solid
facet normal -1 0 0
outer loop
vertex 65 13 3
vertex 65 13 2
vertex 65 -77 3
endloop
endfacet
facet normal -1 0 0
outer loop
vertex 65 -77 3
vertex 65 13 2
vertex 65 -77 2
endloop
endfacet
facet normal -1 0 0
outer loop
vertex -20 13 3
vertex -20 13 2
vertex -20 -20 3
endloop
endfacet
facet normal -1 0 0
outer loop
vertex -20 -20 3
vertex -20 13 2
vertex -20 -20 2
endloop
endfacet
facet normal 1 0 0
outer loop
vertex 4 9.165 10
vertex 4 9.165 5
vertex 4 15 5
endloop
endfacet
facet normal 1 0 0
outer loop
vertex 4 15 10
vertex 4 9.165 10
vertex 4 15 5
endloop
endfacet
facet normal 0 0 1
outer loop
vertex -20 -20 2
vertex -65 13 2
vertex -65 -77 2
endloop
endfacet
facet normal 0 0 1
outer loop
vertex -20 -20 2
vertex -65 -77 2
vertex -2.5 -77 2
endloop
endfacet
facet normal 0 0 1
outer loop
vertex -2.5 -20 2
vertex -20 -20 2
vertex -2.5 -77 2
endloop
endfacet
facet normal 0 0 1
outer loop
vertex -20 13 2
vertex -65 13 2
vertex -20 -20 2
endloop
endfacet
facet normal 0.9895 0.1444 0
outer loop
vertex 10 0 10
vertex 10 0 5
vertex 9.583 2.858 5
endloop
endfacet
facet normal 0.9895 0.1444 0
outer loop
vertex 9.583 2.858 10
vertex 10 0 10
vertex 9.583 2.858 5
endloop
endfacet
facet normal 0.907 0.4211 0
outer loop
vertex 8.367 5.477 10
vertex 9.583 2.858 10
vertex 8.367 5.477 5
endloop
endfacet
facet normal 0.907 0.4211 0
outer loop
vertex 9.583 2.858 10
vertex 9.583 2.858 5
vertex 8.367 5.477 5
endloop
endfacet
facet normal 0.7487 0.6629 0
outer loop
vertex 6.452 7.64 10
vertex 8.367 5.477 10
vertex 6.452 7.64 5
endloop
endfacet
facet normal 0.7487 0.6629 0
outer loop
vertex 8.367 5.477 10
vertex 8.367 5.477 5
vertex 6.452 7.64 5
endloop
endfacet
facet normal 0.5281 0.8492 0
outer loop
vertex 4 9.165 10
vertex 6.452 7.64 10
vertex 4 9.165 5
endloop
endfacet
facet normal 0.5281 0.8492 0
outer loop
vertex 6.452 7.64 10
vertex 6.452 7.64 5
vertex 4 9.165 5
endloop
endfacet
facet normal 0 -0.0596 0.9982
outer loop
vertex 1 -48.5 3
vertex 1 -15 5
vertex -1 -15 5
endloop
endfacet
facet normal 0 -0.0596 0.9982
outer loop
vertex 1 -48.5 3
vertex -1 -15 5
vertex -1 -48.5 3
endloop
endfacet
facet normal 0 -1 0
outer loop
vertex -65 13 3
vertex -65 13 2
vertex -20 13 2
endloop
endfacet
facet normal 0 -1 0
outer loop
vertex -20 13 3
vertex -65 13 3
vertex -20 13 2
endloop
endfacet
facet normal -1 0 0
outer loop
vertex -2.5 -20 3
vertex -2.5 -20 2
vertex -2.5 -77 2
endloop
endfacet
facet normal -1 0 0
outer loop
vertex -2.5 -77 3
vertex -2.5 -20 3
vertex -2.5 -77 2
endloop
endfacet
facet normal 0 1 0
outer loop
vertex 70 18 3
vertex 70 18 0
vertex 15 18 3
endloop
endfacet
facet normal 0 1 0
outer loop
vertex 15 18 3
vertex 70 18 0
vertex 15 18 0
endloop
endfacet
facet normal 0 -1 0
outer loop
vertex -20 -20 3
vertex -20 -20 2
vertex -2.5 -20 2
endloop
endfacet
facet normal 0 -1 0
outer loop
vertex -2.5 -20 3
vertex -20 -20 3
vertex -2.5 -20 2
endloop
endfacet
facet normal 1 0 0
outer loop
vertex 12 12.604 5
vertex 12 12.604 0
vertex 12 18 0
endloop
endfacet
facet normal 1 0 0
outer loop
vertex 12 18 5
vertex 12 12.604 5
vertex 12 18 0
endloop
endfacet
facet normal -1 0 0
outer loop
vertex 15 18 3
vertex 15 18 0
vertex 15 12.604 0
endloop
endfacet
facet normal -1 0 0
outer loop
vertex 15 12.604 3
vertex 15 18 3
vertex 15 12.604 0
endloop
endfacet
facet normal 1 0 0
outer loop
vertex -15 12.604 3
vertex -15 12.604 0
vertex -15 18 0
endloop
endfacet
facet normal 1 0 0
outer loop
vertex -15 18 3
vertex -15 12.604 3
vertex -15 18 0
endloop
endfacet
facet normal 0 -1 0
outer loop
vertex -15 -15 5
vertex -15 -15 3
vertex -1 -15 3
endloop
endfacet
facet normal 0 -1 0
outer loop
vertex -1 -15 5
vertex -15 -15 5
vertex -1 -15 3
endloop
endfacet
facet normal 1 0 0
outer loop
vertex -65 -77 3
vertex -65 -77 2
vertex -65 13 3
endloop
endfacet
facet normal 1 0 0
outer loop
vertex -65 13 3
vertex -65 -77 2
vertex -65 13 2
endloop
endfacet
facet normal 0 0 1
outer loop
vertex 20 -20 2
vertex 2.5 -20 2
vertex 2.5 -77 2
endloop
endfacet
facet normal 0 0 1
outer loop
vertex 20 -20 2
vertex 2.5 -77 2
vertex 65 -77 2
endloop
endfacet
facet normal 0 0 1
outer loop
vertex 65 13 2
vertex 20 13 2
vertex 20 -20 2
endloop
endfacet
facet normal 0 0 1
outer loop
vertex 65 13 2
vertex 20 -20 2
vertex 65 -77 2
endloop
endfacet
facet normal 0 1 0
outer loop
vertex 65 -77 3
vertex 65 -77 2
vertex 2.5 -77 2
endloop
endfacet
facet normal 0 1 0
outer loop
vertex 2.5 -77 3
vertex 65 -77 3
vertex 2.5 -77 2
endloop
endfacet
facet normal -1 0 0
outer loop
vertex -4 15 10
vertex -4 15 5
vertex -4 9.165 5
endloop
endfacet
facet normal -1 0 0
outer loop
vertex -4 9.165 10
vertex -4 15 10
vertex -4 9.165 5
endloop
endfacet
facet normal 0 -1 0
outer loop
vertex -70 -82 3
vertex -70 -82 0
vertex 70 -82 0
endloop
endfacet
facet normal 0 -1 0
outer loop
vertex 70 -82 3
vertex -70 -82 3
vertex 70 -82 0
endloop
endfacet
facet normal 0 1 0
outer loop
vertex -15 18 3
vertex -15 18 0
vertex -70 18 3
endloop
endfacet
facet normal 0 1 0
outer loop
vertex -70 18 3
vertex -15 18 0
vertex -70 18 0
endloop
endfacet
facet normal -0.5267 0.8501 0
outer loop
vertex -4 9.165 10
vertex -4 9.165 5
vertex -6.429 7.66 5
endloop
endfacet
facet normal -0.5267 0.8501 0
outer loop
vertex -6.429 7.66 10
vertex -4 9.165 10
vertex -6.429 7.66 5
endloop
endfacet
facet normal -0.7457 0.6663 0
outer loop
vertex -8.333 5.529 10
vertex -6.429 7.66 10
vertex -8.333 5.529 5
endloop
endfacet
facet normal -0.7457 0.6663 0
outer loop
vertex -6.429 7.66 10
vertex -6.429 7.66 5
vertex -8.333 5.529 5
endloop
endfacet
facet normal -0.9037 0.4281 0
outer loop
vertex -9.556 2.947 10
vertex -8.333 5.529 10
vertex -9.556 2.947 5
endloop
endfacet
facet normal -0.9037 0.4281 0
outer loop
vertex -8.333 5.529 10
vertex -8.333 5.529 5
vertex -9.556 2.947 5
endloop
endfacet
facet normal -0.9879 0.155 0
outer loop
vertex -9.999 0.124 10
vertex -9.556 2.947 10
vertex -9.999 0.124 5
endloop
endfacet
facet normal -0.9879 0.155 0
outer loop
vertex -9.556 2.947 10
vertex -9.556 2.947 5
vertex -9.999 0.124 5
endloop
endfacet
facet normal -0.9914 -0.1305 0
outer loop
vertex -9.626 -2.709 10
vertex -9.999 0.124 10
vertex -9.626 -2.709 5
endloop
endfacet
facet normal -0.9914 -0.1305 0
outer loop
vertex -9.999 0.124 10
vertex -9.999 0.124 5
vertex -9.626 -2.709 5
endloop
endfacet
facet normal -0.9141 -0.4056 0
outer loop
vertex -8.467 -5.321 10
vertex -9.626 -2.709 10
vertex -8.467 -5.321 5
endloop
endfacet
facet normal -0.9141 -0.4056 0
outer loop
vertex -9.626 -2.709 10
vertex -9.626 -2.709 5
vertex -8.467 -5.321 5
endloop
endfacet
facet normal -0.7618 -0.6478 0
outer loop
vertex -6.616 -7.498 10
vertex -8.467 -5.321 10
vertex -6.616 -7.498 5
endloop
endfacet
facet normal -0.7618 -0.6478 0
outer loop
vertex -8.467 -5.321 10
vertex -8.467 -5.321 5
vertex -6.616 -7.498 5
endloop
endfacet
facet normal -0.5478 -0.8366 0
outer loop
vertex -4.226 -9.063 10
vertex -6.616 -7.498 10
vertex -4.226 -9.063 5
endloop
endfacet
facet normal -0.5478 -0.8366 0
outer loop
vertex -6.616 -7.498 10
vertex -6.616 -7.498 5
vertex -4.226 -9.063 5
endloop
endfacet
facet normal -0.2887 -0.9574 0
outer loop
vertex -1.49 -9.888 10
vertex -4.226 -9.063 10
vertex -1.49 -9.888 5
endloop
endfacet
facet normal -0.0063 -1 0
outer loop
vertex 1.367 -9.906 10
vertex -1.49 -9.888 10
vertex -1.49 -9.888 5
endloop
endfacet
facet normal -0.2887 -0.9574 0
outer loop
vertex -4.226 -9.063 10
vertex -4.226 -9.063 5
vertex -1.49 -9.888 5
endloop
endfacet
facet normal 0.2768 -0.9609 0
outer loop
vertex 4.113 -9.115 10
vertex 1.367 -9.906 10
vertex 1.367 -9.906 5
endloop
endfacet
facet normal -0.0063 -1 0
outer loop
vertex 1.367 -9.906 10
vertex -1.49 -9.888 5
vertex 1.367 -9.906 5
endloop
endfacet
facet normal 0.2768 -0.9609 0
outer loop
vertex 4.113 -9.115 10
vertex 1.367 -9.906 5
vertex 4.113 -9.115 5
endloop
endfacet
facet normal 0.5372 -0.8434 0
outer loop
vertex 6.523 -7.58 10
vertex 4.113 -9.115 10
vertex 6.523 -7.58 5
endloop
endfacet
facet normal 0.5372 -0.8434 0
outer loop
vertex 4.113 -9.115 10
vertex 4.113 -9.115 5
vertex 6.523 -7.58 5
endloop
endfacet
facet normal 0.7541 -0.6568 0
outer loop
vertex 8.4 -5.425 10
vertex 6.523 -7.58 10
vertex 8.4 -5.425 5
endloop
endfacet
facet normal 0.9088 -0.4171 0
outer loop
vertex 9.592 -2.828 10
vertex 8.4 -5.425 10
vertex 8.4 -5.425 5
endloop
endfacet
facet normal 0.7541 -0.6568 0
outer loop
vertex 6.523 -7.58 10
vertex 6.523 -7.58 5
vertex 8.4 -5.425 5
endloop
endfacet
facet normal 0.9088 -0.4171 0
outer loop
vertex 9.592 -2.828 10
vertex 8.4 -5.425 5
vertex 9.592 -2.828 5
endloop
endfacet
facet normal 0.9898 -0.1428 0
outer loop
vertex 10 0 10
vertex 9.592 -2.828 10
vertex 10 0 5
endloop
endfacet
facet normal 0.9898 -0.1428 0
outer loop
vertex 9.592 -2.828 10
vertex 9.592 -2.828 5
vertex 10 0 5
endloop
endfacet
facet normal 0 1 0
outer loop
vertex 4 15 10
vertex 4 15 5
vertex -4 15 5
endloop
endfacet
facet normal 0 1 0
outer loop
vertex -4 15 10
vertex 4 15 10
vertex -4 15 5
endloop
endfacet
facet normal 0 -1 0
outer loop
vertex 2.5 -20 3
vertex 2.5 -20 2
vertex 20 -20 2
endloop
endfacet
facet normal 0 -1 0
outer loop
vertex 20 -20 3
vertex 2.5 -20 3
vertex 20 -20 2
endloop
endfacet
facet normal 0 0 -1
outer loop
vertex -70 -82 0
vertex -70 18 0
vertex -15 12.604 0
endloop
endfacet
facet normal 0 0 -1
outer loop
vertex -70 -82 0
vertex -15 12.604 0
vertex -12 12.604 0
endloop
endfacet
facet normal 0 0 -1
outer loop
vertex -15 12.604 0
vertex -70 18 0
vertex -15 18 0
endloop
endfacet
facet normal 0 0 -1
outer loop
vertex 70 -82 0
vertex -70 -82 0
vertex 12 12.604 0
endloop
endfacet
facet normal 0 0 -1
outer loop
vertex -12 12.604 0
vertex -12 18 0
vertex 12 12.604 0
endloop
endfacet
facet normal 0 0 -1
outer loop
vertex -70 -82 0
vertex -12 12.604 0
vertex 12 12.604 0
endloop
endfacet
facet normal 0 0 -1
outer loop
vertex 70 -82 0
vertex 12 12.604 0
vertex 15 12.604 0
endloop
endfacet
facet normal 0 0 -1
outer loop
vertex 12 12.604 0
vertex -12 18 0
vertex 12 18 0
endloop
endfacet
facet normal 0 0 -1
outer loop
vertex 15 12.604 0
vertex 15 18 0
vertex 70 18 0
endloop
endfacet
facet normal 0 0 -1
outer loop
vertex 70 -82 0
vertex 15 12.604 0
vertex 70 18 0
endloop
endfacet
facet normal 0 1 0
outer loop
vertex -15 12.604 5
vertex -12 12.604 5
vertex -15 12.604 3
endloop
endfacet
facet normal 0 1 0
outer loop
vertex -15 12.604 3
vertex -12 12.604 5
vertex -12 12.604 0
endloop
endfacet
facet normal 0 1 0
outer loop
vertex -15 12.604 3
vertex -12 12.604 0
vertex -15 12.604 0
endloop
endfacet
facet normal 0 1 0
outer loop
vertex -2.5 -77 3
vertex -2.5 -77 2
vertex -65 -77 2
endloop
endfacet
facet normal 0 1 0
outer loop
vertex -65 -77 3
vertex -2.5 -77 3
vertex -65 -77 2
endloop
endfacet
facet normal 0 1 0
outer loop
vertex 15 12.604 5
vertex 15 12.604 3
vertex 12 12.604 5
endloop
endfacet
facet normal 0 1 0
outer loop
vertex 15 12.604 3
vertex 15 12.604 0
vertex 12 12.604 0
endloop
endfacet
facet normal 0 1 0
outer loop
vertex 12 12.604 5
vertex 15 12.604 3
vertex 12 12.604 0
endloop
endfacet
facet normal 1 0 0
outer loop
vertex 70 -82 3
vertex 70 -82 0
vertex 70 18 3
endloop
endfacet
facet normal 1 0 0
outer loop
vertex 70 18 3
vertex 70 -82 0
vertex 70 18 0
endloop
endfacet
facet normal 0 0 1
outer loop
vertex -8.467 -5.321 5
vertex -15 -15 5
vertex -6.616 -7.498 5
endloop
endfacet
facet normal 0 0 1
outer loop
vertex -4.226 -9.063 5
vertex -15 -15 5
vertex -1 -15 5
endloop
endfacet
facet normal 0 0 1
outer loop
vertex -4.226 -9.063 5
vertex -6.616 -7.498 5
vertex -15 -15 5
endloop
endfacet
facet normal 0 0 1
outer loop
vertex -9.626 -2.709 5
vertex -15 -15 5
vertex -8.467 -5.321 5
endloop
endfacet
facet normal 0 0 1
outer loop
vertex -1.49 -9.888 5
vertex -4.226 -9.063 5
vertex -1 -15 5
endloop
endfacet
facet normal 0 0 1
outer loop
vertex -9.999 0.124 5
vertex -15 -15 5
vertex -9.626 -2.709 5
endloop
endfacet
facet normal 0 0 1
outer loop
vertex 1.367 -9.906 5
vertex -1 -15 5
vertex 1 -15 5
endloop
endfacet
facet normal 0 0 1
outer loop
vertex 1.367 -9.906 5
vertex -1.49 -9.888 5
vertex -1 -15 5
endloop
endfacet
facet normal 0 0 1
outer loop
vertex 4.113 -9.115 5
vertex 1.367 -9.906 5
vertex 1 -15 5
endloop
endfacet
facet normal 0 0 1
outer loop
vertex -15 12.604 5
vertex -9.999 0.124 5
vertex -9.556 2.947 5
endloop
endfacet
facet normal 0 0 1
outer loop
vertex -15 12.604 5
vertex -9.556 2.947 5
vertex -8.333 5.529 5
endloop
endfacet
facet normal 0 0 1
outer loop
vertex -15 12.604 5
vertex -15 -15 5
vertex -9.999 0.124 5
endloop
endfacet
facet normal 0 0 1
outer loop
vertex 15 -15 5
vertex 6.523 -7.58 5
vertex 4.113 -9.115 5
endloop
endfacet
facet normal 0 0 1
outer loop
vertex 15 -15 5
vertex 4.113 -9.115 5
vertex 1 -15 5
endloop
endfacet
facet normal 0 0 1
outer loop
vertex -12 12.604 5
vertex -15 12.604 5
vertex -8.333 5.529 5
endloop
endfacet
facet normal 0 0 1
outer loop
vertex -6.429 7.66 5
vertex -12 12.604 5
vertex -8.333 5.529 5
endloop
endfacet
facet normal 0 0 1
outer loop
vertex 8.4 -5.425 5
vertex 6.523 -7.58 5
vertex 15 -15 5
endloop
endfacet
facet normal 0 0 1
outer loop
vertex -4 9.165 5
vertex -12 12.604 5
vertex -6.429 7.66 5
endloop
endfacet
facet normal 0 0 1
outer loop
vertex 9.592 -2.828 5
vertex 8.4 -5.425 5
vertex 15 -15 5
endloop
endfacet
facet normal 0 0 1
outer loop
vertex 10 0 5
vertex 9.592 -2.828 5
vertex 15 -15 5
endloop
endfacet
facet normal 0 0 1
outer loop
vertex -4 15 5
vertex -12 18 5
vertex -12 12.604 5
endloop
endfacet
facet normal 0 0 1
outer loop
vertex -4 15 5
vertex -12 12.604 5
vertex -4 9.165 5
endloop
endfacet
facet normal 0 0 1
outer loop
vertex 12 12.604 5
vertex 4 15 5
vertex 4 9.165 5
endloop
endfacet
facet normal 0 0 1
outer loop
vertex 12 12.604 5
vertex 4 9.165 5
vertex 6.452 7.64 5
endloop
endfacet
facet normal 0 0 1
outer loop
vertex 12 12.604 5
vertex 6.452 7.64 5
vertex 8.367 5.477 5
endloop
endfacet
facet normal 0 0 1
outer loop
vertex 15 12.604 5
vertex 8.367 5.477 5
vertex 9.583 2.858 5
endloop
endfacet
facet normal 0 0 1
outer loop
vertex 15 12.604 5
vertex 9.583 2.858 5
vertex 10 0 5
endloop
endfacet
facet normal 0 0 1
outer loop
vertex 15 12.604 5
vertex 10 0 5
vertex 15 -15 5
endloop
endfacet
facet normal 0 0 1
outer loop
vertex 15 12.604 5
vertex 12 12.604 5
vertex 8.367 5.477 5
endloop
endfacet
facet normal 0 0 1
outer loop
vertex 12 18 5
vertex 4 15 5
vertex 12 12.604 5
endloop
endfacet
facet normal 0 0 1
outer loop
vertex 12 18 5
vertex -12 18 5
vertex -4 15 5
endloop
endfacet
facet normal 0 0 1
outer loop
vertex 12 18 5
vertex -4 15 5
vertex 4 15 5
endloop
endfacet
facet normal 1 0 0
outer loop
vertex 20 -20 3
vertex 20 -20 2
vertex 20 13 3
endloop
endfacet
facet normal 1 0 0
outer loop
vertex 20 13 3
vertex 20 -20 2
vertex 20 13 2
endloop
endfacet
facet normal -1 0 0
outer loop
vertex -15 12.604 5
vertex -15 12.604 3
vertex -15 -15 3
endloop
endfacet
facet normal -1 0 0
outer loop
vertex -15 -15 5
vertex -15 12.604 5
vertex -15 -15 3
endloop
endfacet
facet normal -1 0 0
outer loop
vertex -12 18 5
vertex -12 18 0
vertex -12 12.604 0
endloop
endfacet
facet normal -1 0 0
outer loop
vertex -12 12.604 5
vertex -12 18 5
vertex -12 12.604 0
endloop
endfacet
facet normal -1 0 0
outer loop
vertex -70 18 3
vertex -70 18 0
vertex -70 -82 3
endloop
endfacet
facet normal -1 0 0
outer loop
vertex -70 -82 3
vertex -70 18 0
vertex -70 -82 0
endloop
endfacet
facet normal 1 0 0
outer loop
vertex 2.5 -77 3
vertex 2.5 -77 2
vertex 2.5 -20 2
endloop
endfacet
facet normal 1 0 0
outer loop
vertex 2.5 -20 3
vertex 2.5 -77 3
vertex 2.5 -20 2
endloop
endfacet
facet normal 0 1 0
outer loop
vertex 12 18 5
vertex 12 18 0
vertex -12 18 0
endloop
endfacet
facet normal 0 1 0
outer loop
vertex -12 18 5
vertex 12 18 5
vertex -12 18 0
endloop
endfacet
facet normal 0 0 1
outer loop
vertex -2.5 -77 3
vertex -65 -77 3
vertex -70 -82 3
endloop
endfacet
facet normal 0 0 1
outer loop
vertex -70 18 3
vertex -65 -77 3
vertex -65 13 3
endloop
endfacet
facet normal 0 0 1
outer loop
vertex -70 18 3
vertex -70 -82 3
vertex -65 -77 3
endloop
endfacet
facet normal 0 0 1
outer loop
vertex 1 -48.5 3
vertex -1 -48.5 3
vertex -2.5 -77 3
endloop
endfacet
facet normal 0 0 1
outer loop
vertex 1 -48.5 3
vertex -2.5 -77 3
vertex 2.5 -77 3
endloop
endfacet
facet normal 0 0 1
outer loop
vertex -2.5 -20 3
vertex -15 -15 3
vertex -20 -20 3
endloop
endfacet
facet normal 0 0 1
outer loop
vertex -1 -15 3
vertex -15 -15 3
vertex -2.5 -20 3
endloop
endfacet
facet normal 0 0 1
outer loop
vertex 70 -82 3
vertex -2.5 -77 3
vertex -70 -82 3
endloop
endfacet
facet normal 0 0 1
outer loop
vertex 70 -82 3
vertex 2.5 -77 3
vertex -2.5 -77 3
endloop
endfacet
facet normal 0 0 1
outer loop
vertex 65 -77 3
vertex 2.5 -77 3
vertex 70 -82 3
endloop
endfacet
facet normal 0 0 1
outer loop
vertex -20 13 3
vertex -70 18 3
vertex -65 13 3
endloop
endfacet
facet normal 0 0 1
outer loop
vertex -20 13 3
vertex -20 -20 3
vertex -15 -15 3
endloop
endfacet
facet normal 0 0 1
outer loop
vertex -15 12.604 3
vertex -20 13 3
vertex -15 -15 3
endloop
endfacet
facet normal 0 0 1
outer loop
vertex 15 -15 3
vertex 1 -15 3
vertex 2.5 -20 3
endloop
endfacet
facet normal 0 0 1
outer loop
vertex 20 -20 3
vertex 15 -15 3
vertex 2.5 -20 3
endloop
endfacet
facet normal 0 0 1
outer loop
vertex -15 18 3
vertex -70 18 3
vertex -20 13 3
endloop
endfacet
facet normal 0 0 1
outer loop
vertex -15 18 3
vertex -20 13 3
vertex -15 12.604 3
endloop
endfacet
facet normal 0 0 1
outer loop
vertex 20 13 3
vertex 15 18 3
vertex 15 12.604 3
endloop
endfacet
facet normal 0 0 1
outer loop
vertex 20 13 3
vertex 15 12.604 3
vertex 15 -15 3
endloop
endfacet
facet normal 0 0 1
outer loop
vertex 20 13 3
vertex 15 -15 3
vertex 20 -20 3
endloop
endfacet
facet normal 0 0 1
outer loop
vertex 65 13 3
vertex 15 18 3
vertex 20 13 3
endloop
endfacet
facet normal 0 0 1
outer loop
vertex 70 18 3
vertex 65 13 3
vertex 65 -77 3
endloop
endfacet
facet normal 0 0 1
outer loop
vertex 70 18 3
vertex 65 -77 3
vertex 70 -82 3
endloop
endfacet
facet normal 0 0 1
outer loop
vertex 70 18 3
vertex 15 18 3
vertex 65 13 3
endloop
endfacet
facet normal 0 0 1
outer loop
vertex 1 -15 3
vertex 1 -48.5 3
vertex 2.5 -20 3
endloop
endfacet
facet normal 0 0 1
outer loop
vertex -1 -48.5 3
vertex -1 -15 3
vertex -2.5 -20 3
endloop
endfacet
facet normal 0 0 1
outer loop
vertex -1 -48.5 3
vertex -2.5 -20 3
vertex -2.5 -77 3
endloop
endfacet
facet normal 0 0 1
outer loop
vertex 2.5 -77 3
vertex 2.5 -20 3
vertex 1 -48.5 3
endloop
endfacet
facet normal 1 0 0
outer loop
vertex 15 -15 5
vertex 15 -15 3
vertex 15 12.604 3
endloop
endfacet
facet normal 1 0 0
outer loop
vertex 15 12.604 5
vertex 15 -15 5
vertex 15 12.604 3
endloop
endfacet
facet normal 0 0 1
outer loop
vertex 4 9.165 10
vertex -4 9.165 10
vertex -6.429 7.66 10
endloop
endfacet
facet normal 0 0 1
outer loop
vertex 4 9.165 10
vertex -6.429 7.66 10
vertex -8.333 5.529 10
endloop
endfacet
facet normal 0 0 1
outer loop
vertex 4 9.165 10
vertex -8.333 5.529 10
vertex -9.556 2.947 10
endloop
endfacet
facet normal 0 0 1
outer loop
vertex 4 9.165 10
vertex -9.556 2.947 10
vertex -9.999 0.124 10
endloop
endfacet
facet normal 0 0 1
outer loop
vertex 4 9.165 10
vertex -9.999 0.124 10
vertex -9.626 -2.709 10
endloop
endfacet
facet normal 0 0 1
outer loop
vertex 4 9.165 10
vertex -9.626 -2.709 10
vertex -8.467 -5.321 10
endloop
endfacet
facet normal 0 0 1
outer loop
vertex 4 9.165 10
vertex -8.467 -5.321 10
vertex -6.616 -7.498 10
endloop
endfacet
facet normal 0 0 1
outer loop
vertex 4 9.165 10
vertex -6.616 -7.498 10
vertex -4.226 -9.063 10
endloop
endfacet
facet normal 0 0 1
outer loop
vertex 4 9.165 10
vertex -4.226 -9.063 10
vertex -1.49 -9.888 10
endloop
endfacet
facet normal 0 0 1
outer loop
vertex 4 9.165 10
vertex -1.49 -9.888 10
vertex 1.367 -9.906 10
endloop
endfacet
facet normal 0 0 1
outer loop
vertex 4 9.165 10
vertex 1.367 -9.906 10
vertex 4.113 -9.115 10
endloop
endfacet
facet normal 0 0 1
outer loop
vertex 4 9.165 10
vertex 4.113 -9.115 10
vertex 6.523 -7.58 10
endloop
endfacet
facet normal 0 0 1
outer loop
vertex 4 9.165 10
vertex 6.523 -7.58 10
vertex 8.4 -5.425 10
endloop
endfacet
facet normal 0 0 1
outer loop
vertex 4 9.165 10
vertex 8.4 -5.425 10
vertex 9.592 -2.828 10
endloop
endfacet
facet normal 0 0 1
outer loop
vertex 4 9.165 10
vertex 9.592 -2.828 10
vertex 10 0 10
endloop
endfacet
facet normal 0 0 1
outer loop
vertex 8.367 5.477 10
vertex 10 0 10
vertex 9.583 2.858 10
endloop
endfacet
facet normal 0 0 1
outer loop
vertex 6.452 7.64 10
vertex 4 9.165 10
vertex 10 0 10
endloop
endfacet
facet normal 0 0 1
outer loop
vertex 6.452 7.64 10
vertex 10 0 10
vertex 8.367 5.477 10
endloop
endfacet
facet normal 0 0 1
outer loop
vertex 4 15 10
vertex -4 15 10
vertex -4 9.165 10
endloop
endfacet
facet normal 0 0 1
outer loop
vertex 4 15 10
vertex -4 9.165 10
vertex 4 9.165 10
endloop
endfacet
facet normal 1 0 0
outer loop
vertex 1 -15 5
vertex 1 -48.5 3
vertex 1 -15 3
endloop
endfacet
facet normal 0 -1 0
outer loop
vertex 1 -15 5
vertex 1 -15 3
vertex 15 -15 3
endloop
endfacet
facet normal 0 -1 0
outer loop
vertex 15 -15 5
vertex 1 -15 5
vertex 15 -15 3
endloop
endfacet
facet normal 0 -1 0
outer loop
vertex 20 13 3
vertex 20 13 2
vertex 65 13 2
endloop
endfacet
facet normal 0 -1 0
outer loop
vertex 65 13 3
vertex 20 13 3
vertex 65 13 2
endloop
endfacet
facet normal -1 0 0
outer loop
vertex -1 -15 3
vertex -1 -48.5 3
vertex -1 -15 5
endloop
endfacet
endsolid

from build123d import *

# Parameters (mm, degrees)
F1_DEPTH = 3
F2_DEPTH = 5
F3_DEPTH = 10
F5_DEPTH = 1
F6_DEPTH = 2


with BuildPart() as f1:
    # F0 (on Top) → F1 (new body)
    with BuildSketch(Plane.XY):
        Polygon((15, -15), (-15, -15), (-15, 12.604296), (-15, 18), (-70, 18), (-70, -82), (70, -82), (70, 18), (15, 18), (15, 12.604296), align=None)
        Polygon((-2.5, -77), (-65, -77), (-65, 13), (-20, 13), (-20, -20), (-2.5, -20), align=None, mode=Mode.SUBTRACT)
        Polygon((2.5, -20), (20, -20), (20, 13), (65, 13), (65, -77), (2.5, -77), align=None, mode=Mode.SUBTRACT)
        Polygon((-15, 12.604296), (-15, -15), (15, -15), (15, 12.604296), (12, 12.604296), (12, 18), (-12, 18), (-12, 12.604296), align=None)
        with BuildLine():
            ThreePointArc((4, 9.165151), (8.3666, 5.477226), (10, 0))
            ThreePointArc((10, 0), (-5.477226, -8.3666), (-4, 9.165151))
            Line((-4, 9.165151), (-4, 15))
            Line((-4, 15), (4, 15))
            Line((4, 15), (4, 9.165151))
        make_face(mode=Mode.SUBTRACT)
    extrude(amount=F1_DEPTH)

    # F0 (on Top) → F2 (join)
    with BuildSketch(Plane.XY):
        Polygon((-15, 12.604296), (-15, -15), (15, -15), (15, 12.604296), (12, 12.604296), (12, 18), (-12, 18), (-12, 12.604296), align=None)
        with BuildLine():
            ThreePointArc((4, 9.165151), (8.3666, 5.477226), (10, 0))
            ThreePointArc((10, 0), (-5.477226, -8.3666), (-4, 9.165151))
            Line((-4, 9.165151), (-4, 15))
            Line((-4, 15), (4, 15))
            Line((4, 15), (4, 9.165151))
        make_face(mode=Mode.SUBTRACT)
    extrude(amount=F2_DEPTH)

    # F0 (on Top) → F3 (join)
    with BuildSketch(Plane.XY):
        with BuildLine():
            ThreePointArc((-4, 9.165151), (0, 10), (4, 9.165151))
            Line((4, 9.165151), (4, 15))
            Line((4, 15), (-4, 15))
            Line((-4, 15), (-4, 9.165151))
        make_face()
        with BuildLine():
            Line((4, 0), (4, 9.165151))
            ThreePointArc((4, 9.165151), (0, 10), (-4, 9.165151))
            Line((-4, 9.165151), (-4, 0))
            Line((-4, 0), (4, 0))
        make_face()
        with BuildLine():
            ThreePointArc((-4, 9.165151), (-5.477226, -8.3666), (10, 0))
            ThreePointArc((10, 0), (8.3666, 5.477226), (4, 9.165151))
            Line((4, 9.165151), (4, 0))
            Line((4, 0), (-4, 0))
            Line((-4, 0), (-4, 9.165151))
        make_face()
    extrude(amount=F3_DEPTH)

    # F4 (on Right) → F5 (join, symmetric)
    with BuildSketch(Plane.YZ):
        Polygon((-15, 3), (-15, 5), (-48.5, 3), align=None)
    extrude(amount=F5_DEPTH, both=True)

    # F0 (on Top) → F6 (join)
    with BuildSketch(Plane.XY):
        Polygon((-65, 13), (-65, -77), (-2.5, -77), (-2.5, -20), (-20, -20), (-20, 13), align=None)
        Polygon((20, 13), (20, -20), (2.5, -20), (2.5, -77), (65, -77), (65, 13), align=None)
    extrude(amount=F6_DEPTH)


solid = f1.part
